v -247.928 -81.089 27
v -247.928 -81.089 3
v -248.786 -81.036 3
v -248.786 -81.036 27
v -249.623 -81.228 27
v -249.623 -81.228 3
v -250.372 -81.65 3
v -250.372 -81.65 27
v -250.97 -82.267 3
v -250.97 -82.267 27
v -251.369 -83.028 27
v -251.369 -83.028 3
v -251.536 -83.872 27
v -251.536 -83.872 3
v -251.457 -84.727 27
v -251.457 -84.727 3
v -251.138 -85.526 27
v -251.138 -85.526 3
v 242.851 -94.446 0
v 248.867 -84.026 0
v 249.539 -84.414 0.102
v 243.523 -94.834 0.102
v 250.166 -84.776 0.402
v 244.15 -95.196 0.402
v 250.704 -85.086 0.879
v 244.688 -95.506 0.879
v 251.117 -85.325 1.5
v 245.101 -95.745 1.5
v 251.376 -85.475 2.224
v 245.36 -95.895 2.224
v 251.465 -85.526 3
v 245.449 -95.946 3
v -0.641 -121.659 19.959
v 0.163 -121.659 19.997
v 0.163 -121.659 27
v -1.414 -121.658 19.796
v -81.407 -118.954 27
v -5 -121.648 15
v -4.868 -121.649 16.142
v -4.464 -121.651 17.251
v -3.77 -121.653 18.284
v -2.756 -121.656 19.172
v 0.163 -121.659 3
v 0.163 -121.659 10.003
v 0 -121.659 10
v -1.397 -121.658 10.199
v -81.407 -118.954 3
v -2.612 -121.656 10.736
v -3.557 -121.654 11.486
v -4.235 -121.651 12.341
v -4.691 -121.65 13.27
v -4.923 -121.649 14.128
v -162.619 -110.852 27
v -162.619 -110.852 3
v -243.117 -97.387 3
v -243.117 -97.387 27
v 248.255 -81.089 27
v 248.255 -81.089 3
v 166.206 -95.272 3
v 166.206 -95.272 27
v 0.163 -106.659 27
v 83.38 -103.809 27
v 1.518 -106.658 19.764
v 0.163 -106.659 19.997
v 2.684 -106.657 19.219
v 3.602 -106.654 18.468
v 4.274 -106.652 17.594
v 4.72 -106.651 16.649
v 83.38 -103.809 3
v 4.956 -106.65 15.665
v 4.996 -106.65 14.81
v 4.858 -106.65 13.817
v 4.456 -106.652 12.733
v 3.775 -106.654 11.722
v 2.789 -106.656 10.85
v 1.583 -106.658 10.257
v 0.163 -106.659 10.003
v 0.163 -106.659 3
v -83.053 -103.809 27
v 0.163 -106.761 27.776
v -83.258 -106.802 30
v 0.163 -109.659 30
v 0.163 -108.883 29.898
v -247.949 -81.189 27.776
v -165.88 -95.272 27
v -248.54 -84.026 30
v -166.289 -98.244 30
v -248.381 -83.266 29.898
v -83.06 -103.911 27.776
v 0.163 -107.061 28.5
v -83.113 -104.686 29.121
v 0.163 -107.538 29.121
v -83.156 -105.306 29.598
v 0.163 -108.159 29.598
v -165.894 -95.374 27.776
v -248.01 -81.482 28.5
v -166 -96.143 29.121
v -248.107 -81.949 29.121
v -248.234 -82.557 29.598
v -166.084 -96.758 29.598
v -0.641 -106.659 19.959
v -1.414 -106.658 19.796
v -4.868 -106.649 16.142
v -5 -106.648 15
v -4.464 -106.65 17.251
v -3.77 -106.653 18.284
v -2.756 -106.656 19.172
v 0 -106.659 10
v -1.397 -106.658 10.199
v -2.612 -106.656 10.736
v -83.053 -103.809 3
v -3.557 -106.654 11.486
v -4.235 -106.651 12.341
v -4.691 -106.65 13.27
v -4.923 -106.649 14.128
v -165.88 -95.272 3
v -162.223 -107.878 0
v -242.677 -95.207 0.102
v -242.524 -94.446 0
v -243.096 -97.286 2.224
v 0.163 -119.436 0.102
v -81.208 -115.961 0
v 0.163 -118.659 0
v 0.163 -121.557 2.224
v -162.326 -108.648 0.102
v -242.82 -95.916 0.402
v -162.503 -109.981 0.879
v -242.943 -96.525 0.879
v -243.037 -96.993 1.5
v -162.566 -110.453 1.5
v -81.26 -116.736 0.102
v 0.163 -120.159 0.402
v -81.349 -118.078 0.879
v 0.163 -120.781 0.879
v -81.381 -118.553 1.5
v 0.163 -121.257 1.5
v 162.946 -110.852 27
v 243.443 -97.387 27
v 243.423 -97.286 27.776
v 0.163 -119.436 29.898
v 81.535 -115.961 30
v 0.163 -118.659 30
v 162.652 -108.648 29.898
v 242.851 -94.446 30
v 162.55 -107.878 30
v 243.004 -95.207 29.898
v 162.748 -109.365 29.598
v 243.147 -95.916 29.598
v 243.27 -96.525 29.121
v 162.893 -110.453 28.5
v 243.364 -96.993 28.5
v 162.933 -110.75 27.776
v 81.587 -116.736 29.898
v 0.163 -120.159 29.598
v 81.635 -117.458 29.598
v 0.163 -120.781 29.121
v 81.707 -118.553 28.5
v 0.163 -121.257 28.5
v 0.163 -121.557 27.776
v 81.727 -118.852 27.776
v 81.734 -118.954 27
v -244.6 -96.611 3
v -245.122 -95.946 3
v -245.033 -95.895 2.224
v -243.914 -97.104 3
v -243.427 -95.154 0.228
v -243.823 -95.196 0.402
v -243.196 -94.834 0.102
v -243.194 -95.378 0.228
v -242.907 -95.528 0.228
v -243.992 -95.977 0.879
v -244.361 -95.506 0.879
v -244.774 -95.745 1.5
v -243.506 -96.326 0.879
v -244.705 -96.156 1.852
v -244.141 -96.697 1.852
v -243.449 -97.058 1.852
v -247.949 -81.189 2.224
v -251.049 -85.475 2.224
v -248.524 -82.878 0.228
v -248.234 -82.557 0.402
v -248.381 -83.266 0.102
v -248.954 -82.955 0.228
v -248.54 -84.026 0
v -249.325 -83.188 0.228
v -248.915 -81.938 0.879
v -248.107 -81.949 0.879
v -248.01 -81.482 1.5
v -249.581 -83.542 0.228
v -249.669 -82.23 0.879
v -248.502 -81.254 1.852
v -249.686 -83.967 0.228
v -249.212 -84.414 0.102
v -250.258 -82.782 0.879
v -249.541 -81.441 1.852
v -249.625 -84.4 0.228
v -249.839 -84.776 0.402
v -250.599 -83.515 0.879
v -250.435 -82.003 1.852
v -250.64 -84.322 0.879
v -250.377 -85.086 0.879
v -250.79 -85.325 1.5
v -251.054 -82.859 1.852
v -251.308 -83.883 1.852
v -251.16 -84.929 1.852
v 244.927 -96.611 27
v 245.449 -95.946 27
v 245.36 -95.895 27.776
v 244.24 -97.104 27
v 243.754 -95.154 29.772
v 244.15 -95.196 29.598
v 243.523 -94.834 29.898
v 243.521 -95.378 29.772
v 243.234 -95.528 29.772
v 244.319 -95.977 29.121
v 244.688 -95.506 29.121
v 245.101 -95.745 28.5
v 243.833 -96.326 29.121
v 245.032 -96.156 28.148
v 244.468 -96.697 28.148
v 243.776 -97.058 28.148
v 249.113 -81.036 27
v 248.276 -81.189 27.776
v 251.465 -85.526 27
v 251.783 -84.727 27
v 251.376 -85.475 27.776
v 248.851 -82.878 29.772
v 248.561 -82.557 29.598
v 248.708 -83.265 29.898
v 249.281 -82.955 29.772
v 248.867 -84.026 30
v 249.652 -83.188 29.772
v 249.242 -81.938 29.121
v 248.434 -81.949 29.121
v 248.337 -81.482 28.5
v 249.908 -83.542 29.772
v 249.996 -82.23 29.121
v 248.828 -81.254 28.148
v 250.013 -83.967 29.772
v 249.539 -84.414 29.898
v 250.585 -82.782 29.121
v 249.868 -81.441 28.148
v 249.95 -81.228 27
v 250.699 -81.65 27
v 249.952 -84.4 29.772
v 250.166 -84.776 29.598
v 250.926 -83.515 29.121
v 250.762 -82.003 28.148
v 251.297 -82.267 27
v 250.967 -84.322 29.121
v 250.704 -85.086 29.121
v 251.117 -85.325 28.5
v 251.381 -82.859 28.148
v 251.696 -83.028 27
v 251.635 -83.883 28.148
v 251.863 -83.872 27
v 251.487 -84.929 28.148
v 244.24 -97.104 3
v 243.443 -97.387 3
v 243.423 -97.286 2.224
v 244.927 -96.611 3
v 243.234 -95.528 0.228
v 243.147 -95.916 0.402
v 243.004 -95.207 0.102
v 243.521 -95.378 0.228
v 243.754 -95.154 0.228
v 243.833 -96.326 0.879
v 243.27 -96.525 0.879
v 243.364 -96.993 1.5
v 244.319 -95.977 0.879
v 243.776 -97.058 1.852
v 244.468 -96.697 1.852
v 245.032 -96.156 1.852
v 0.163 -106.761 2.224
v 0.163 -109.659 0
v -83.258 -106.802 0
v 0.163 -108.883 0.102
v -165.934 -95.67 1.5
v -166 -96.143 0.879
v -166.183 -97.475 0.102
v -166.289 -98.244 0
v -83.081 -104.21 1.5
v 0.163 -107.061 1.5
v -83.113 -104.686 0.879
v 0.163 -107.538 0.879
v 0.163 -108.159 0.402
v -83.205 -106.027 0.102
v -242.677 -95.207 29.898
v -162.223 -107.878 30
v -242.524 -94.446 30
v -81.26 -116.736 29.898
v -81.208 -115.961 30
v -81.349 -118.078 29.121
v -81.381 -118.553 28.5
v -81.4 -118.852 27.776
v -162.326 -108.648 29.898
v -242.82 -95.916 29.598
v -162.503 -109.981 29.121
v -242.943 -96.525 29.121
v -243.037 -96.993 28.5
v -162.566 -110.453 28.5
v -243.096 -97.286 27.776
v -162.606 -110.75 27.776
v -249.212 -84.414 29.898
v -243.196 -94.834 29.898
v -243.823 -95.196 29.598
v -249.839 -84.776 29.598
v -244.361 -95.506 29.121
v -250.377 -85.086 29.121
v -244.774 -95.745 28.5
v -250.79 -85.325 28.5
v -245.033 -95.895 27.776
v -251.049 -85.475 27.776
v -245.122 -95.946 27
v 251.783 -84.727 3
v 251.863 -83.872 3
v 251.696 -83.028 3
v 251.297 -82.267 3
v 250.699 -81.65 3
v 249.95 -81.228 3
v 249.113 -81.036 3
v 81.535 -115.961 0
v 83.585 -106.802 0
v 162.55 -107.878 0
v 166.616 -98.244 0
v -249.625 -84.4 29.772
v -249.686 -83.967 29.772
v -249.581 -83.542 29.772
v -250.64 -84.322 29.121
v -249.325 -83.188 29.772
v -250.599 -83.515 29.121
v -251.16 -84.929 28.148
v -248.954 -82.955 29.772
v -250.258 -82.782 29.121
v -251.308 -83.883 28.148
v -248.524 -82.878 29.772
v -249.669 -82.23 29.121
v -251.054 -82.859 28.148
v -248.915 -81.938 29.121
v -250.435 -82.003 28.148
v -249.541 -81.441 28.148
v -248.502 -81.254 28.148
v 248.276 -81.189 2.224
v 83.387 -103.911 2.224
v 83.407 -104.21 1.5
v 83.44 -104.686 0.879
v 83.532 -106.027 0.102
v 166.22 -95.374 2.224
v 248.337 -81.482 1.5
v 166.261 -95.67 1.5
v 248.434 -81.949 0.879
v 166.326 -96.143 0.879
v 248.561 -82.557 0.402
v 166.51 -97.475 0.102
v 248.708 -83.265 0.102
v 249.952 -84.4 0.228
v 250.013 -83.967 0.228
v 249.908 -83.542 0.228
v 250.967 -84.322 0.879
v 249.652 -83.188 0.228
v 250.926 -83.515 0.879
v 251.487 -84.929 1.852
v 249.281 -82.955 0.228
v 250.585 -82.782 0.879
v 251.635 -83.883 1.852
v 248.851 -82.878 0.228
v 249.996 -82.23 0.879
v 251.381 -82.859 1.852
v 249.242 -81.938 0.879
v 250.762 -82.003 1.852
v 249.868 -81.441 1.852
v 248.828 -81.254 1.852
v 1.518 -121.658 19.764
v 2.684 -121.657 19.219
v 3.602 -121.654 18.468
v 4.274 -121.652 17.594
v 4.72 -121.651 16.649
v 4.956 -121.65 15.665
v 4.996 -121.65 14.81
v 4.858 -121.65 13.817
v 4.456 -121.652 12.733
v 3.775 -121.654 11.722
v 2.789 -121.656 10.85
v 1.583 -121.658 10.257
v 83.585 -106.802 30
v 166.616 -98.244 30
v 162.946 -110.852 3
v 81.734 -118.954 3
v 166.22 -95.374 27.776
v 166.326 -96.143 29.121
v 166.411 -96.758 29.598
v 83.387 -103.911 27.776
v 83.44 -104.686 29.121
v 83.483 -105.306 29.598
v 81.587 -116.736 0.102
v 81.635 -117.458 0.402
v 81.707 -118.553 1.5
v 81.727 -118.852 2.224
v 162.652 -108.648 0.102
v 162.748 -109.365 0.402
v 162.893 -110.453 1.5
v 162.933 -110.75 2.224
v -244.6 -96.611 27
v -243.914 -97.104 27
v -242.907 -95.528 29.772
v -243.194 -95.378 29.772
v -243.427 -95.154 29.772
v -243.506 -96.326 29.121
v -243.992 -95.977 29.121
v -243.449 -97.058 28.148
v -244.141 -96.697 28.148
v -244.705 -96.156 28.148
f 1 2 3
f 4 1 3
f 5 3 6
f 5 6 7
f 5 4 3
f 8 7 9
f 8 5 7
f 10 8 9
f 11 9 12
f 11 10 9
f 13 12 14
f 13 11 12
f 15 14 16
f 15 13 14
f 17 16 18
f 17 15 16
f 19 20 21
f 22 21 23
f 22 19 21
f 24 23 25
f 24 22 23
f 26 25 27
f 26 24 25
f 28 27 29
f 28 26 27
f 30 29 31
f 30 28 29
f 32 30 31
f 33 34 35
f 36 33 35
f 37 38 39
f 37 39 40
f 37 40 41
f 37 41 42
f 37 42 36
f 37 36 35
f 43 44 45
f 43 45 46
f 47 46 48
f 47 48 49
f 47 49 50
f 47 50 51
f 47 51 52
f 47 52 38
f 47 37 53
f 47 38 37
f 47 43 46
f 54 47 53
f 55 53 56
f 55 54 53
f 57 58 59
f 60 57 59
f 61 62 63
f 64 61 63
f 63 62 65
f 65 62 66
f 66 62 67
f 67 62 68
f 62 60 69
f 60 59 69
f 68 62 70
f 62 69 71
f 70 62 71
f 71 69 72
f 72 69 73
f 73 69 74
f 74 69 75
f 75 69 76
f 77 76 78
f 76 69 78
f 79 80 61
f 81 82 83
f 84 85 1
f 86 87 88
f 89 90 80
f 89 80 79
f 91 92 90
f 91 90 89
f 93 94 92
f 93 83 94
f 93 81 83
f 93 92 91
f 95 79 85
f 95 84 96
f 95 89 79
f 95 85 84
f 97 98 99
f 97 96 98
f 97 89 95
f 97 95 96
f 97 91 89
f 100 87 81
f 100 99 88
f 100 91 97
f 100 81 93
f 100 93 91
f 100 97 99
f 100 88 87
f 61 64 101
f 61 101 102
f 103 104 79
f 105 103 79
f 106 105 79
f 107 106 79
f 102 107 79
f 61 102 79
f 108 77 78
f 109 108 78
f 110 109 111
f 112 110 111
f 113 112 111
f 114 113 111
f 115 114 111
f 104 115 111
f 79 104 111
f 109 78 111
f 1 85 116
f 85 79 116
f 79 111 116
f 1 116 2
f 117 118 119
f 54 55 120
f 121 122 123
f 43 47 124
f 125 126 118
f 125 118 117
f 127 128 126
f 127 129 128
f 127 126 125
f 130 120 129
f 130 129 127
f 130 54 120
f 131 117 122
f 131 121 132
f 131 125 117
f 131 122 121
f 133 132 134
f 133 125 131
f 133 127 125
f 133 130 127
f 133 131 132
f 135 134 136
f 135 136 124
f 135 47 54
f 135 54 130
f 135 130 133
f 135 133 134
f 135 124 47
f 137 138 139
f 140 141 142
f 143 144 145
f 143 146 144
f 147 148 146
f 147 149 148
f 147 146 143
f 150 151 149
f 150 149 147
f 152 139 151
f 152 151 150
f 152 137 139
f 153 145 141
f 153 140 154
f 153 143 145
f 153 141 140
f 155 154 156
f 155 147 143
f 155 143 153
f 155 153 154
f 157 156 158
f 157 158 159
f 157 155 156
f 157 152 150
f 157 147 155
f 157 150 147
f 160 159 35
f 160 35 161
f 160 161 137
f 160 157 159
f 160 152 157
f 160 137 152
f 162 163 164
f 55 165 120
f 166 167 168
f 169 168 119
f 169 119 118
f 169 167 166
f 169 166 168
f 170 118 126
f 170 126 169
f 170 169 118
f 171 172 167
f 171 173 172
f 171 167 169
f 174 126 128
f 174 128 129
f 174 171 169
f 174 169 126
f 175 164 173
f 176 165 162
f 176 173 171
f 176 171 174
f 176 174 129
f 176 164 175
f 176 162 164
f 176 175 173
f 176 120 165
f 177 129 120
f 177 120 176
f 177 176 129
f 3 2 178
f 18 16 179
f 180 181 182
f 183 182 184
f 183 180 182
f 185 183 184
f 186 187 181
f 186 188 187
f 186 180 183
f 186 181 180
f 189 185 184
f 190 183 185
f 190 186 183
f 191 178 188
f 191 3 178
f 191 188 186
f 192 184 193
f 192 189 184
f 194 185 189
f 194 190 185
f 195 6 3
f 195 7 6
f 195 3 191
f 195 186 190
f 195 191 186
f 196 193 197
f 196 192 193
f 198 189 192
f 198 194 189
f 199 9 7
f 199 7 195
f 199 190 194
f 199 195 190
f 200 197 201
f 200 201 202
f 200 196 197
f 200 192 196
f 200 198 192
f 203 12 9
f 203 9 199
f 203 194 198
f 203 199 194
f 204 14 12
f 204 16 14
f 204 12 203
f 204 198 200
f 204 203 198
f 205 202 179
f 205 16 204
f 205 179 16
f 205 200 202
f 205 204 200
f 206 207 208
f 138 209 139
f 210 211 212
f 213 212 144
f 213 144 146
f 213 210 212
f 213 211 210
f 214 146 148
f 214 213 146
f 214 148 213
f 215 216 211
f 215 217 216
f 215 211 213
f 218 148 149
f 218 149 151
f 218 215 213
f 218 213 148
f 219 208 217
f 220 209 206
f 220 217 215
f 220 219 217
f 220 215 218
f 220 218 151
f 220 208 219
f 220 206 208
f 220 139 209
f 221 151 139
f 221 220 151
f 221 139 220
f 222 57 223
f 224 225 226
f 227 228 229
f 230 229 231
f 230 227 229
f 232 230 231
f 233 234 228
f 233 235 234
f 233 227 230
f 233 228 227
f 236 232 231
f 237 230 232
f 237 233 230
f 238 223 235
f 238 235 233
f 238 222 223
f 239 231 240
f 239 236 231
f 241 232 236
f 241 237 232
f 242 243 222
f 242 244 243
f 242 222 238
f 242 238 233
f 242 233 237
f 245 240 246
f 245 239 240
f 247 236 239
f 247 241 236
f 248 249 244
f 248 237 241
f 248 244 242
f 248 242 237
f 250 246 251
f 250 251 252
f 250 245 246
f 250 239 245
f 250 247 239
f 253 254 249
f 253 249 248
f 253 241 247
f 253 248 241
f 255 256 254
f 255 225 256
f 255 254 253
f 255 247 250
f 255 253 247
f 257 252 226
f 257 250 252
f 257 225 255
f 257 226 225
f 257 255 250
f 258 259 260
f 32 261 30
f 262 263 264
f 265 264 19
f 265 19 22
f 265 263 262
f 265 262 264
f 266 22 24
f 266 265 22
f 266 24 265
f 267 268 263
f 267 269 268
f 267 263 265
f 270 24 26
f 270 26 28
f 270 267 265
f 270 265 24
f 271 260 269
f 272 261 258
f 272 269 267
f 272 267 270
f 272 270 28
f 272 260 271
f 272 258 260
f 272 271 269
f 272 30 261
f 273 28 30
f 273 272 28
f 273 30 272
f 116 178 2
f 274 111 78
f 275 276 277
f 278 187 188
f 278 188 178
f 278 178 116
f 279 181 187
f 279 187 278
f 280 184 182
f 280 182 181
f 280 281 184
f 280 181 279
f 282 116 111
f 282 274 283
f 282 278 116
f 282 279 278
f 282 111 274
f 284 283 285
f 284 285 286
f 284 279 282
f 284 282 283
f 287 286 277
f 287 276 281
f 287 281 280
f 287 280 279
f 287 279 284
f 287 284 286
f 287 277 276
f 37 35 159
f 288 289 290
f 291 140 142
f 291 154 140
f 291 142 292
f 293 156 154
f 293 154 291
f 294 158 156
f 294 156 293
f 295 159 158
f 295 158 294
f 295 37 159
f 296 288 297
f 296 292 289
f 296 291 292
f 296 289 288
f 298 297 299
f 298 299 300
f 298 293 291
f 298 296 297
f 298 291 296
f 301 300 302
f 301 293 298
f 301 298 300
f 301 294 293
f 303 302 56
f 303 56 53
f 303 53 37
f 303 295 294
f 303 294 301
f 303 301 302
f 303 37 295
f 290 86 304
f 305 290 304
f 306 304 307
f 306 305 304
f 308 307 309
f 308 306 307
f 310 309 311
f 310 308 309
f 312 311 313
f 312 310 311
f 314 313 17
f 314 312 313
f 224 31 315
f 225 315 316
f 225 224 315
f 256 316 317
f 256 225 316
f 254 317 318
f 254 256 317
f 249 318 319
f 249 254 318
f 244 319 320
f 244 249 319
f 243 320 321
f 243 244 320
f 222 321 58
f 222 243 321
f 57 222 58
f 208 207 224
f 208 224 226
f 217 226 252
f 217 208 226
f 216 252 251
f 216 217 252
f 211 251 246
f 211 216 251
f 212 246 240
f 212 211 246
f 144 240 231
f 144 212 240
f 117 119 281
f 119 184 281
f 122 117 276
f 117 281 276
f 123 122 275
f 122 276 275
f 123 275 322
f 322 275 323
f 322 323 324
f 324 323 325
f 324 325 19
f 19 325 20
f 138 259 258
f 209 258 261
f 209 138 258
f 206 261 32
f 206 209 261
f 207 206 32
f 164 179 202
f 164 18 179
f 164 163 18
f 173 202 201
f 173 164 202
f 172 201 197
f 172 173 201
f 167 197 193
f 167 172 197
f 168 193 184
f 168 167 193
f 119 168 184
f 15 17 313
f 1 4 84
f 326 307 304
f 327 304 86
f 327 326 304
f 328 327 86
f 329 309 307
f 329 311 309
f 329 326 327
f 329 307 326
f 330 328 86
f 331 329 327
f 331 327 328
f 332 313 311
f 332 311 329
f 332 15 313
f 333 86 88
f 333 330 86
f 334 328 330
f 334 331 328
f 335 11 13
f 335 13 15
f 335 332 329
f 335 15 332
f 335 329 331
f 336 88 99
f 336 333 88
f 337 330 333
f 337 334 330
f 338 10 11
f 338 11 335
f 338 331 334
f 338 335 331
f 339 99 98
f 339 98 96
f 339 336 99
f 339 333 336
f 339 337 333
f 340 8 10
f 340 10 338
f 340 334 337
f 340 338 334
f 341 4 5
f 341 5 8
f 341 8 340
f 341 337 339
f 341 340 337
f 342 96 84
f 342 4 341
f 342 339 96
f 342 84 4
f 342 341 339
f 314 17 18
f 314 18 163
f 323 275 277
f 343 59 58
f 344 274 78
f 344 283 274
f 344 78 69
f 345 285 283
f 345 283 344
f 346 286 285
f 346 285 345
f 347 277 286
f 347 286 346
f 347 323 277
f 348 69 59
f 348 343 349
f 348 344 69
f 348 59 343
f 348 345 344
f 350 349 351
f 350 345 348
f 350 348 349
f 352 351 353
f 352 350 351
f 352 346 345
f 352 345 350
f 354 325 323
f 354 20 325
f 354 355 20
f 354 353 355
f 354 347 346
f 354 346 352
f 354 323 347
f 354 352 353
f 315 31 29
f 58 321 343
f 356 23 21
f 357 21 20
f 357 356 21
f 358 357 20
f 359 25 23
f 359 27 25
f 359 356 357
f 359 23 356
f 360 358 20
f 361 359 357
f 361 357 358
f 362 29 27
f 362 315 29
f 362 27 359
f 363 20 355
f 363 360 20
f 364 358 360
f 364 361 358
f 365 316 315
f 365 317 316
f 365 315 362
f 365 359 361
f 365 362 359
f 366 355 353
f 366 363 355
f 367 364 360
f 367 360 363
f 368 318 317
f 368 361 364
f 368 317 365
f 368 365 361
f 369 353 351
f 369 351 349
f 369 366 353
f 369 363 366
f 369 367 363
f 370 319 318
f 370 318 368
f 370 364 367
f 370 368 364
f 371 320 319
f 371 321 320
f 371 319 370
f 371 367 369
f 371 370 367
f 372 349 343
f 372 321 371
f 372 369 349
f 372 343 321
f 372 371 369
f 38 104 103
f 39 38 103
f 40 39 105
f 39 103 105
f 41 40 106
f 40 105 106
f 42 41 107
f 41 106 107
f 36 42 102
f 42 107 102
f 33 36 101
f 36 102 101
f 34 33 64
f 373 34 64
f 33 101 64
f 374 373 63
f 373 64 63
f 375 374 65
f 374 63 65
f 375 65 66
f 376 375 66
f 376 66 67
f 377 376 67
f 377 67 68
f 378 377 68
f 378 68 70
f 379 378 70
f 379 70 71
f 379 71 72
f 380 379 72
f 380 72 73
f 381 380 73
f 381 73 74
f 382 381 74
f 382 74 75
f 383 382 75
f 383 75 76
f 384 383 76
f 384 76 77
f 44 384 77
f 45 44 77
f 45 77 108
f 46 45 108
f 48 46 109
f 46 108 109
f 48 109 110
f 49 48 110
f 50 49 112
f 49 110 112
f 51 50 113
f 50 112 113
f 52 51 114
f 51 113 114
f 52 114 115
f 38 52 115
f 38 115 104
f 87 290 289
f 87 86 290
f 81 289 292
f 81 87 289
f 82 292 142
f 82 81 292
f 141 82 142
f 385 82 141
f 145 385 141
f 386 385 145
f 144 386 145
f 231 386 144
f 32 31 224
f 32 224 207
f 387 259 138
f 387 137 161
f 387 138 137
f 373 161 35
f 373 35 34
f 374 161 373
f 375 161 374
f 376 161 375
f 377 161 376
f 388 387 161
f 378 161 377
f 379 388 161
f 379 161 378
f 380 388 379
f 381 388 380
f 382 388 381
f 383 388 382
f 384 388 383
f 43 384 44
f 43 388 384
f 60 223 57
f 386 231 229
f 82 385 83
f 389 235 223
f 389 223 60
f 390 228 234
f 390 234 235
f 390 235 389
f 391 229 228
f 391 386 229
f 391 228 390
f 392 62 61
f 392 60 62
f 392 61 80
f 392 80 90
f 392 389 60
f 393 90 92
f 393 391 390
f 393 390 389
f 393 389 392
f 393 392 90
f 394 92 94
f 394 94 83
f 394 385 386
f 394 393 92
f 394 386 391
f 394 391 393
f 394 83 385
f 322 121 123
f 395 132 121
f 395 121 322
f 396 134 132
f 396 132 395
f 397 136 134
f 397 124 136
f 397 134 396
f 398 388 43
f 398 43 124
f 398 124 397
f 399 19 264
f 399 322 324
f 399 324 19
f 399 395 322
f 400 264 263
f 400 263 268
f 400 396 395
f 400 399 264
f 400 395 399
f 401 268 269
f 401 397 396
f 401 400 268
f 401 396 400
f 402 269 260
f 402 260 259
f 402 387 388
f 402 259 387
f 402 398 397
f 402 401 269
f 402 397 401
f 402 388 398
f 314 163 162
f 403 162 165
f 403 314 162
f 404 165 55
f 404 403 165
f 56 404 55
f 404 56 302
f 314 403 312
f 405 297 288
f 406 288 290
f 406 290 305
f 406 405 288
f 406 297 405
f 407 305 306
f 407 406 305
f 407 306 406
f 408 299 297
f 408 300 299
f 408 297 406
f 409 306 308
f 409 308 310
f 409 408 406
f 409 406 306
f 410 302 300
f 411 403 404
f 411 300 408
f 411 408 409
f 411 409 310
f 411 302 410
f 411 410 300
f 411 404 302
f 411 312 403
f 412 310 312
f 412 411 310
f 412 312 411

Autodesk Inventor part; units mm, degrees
ref_plane "YZ Plane" through (0, 0, 0) normal (1, 0, 0) x (0, 1, 0)
ref_plane "XZ Plane" through (0, 0, 0) normal (0, 1, 0) x (-1, 0, 0)
ref_plane "XY Plane" through (0, 0, 0) normal (0, 0, 1) x (1, 0, 0)
sketch "Sketch1" plane through (0, 0, 0) normal (0, 0, 1) x (1, 0, 0)
  arc A0 (0.1634, -106.6592) -> (254.828, -79.7002) centre (0.1634, 1109.6463) ccw
  arc A1 (0.1634, -121.6592) -> (244.7719, -97.118) centre (0.1634, 1109.6463) ccw
  line L0 (254.828, -79.7002) -> (244.7719, -97.118)
  line L1 (254.828, -79.7002) -> (274.9404, -79.7002) construction
  line L2 (0.1634, -121.6592) -> (0.1634, -88.4091)
  arc A2 (-244.445, -97.118) -> (0.1634, -121.6592) centre (0.1634, 1109.6463) ccw
  arc A3 (-254.5012, -79.7002) -> (0.1634, -106.6592) centre (0.1634, 1109.6463) ccw
  line L3 (-254.5012, -79.7002) -> (-244.445, -97.118)
  point P0 (0, 0)
  point P1 (226.5563, -100.6675)
  dimension "d0" = 15
  dimension "d1" = 120
extrude "Extrusion1" add sketch "Sketch1" along normal blind 30
fillet "Fillet1" radius 3 12 edges at (-127.8803, -99.9007, 30) (123.0817, -115.5086, 30) (128.2072, -99.9007, 0) (249.8, -88.4091, 30) (254.828, -79.7002, 15) (244.7719, -97.118, 15) (249.8, -88.4091, 0) (123.0817, -115.5086, 0) (-249.4731, -88.4091, 0) (-244.445, -97.118, 15) (-249.4731, -88.4091, 30) (-254.5012, -79.7002, 15)
sketch "Sketch2" plane through (0, 0, 0) normal (0, 1, 0) x (-1, 0, 0)
  line L0 (0, 0) -> (0, 15)
  circle A0 centre (0, 15) radius 5
  dimension "d5" = 15
  dimension "d6" = 10
extrude "Extrusion2" cut sketch "Sketch2" against normal blind 300
properties part number "leaf 4" material "Steel, Carbon"
